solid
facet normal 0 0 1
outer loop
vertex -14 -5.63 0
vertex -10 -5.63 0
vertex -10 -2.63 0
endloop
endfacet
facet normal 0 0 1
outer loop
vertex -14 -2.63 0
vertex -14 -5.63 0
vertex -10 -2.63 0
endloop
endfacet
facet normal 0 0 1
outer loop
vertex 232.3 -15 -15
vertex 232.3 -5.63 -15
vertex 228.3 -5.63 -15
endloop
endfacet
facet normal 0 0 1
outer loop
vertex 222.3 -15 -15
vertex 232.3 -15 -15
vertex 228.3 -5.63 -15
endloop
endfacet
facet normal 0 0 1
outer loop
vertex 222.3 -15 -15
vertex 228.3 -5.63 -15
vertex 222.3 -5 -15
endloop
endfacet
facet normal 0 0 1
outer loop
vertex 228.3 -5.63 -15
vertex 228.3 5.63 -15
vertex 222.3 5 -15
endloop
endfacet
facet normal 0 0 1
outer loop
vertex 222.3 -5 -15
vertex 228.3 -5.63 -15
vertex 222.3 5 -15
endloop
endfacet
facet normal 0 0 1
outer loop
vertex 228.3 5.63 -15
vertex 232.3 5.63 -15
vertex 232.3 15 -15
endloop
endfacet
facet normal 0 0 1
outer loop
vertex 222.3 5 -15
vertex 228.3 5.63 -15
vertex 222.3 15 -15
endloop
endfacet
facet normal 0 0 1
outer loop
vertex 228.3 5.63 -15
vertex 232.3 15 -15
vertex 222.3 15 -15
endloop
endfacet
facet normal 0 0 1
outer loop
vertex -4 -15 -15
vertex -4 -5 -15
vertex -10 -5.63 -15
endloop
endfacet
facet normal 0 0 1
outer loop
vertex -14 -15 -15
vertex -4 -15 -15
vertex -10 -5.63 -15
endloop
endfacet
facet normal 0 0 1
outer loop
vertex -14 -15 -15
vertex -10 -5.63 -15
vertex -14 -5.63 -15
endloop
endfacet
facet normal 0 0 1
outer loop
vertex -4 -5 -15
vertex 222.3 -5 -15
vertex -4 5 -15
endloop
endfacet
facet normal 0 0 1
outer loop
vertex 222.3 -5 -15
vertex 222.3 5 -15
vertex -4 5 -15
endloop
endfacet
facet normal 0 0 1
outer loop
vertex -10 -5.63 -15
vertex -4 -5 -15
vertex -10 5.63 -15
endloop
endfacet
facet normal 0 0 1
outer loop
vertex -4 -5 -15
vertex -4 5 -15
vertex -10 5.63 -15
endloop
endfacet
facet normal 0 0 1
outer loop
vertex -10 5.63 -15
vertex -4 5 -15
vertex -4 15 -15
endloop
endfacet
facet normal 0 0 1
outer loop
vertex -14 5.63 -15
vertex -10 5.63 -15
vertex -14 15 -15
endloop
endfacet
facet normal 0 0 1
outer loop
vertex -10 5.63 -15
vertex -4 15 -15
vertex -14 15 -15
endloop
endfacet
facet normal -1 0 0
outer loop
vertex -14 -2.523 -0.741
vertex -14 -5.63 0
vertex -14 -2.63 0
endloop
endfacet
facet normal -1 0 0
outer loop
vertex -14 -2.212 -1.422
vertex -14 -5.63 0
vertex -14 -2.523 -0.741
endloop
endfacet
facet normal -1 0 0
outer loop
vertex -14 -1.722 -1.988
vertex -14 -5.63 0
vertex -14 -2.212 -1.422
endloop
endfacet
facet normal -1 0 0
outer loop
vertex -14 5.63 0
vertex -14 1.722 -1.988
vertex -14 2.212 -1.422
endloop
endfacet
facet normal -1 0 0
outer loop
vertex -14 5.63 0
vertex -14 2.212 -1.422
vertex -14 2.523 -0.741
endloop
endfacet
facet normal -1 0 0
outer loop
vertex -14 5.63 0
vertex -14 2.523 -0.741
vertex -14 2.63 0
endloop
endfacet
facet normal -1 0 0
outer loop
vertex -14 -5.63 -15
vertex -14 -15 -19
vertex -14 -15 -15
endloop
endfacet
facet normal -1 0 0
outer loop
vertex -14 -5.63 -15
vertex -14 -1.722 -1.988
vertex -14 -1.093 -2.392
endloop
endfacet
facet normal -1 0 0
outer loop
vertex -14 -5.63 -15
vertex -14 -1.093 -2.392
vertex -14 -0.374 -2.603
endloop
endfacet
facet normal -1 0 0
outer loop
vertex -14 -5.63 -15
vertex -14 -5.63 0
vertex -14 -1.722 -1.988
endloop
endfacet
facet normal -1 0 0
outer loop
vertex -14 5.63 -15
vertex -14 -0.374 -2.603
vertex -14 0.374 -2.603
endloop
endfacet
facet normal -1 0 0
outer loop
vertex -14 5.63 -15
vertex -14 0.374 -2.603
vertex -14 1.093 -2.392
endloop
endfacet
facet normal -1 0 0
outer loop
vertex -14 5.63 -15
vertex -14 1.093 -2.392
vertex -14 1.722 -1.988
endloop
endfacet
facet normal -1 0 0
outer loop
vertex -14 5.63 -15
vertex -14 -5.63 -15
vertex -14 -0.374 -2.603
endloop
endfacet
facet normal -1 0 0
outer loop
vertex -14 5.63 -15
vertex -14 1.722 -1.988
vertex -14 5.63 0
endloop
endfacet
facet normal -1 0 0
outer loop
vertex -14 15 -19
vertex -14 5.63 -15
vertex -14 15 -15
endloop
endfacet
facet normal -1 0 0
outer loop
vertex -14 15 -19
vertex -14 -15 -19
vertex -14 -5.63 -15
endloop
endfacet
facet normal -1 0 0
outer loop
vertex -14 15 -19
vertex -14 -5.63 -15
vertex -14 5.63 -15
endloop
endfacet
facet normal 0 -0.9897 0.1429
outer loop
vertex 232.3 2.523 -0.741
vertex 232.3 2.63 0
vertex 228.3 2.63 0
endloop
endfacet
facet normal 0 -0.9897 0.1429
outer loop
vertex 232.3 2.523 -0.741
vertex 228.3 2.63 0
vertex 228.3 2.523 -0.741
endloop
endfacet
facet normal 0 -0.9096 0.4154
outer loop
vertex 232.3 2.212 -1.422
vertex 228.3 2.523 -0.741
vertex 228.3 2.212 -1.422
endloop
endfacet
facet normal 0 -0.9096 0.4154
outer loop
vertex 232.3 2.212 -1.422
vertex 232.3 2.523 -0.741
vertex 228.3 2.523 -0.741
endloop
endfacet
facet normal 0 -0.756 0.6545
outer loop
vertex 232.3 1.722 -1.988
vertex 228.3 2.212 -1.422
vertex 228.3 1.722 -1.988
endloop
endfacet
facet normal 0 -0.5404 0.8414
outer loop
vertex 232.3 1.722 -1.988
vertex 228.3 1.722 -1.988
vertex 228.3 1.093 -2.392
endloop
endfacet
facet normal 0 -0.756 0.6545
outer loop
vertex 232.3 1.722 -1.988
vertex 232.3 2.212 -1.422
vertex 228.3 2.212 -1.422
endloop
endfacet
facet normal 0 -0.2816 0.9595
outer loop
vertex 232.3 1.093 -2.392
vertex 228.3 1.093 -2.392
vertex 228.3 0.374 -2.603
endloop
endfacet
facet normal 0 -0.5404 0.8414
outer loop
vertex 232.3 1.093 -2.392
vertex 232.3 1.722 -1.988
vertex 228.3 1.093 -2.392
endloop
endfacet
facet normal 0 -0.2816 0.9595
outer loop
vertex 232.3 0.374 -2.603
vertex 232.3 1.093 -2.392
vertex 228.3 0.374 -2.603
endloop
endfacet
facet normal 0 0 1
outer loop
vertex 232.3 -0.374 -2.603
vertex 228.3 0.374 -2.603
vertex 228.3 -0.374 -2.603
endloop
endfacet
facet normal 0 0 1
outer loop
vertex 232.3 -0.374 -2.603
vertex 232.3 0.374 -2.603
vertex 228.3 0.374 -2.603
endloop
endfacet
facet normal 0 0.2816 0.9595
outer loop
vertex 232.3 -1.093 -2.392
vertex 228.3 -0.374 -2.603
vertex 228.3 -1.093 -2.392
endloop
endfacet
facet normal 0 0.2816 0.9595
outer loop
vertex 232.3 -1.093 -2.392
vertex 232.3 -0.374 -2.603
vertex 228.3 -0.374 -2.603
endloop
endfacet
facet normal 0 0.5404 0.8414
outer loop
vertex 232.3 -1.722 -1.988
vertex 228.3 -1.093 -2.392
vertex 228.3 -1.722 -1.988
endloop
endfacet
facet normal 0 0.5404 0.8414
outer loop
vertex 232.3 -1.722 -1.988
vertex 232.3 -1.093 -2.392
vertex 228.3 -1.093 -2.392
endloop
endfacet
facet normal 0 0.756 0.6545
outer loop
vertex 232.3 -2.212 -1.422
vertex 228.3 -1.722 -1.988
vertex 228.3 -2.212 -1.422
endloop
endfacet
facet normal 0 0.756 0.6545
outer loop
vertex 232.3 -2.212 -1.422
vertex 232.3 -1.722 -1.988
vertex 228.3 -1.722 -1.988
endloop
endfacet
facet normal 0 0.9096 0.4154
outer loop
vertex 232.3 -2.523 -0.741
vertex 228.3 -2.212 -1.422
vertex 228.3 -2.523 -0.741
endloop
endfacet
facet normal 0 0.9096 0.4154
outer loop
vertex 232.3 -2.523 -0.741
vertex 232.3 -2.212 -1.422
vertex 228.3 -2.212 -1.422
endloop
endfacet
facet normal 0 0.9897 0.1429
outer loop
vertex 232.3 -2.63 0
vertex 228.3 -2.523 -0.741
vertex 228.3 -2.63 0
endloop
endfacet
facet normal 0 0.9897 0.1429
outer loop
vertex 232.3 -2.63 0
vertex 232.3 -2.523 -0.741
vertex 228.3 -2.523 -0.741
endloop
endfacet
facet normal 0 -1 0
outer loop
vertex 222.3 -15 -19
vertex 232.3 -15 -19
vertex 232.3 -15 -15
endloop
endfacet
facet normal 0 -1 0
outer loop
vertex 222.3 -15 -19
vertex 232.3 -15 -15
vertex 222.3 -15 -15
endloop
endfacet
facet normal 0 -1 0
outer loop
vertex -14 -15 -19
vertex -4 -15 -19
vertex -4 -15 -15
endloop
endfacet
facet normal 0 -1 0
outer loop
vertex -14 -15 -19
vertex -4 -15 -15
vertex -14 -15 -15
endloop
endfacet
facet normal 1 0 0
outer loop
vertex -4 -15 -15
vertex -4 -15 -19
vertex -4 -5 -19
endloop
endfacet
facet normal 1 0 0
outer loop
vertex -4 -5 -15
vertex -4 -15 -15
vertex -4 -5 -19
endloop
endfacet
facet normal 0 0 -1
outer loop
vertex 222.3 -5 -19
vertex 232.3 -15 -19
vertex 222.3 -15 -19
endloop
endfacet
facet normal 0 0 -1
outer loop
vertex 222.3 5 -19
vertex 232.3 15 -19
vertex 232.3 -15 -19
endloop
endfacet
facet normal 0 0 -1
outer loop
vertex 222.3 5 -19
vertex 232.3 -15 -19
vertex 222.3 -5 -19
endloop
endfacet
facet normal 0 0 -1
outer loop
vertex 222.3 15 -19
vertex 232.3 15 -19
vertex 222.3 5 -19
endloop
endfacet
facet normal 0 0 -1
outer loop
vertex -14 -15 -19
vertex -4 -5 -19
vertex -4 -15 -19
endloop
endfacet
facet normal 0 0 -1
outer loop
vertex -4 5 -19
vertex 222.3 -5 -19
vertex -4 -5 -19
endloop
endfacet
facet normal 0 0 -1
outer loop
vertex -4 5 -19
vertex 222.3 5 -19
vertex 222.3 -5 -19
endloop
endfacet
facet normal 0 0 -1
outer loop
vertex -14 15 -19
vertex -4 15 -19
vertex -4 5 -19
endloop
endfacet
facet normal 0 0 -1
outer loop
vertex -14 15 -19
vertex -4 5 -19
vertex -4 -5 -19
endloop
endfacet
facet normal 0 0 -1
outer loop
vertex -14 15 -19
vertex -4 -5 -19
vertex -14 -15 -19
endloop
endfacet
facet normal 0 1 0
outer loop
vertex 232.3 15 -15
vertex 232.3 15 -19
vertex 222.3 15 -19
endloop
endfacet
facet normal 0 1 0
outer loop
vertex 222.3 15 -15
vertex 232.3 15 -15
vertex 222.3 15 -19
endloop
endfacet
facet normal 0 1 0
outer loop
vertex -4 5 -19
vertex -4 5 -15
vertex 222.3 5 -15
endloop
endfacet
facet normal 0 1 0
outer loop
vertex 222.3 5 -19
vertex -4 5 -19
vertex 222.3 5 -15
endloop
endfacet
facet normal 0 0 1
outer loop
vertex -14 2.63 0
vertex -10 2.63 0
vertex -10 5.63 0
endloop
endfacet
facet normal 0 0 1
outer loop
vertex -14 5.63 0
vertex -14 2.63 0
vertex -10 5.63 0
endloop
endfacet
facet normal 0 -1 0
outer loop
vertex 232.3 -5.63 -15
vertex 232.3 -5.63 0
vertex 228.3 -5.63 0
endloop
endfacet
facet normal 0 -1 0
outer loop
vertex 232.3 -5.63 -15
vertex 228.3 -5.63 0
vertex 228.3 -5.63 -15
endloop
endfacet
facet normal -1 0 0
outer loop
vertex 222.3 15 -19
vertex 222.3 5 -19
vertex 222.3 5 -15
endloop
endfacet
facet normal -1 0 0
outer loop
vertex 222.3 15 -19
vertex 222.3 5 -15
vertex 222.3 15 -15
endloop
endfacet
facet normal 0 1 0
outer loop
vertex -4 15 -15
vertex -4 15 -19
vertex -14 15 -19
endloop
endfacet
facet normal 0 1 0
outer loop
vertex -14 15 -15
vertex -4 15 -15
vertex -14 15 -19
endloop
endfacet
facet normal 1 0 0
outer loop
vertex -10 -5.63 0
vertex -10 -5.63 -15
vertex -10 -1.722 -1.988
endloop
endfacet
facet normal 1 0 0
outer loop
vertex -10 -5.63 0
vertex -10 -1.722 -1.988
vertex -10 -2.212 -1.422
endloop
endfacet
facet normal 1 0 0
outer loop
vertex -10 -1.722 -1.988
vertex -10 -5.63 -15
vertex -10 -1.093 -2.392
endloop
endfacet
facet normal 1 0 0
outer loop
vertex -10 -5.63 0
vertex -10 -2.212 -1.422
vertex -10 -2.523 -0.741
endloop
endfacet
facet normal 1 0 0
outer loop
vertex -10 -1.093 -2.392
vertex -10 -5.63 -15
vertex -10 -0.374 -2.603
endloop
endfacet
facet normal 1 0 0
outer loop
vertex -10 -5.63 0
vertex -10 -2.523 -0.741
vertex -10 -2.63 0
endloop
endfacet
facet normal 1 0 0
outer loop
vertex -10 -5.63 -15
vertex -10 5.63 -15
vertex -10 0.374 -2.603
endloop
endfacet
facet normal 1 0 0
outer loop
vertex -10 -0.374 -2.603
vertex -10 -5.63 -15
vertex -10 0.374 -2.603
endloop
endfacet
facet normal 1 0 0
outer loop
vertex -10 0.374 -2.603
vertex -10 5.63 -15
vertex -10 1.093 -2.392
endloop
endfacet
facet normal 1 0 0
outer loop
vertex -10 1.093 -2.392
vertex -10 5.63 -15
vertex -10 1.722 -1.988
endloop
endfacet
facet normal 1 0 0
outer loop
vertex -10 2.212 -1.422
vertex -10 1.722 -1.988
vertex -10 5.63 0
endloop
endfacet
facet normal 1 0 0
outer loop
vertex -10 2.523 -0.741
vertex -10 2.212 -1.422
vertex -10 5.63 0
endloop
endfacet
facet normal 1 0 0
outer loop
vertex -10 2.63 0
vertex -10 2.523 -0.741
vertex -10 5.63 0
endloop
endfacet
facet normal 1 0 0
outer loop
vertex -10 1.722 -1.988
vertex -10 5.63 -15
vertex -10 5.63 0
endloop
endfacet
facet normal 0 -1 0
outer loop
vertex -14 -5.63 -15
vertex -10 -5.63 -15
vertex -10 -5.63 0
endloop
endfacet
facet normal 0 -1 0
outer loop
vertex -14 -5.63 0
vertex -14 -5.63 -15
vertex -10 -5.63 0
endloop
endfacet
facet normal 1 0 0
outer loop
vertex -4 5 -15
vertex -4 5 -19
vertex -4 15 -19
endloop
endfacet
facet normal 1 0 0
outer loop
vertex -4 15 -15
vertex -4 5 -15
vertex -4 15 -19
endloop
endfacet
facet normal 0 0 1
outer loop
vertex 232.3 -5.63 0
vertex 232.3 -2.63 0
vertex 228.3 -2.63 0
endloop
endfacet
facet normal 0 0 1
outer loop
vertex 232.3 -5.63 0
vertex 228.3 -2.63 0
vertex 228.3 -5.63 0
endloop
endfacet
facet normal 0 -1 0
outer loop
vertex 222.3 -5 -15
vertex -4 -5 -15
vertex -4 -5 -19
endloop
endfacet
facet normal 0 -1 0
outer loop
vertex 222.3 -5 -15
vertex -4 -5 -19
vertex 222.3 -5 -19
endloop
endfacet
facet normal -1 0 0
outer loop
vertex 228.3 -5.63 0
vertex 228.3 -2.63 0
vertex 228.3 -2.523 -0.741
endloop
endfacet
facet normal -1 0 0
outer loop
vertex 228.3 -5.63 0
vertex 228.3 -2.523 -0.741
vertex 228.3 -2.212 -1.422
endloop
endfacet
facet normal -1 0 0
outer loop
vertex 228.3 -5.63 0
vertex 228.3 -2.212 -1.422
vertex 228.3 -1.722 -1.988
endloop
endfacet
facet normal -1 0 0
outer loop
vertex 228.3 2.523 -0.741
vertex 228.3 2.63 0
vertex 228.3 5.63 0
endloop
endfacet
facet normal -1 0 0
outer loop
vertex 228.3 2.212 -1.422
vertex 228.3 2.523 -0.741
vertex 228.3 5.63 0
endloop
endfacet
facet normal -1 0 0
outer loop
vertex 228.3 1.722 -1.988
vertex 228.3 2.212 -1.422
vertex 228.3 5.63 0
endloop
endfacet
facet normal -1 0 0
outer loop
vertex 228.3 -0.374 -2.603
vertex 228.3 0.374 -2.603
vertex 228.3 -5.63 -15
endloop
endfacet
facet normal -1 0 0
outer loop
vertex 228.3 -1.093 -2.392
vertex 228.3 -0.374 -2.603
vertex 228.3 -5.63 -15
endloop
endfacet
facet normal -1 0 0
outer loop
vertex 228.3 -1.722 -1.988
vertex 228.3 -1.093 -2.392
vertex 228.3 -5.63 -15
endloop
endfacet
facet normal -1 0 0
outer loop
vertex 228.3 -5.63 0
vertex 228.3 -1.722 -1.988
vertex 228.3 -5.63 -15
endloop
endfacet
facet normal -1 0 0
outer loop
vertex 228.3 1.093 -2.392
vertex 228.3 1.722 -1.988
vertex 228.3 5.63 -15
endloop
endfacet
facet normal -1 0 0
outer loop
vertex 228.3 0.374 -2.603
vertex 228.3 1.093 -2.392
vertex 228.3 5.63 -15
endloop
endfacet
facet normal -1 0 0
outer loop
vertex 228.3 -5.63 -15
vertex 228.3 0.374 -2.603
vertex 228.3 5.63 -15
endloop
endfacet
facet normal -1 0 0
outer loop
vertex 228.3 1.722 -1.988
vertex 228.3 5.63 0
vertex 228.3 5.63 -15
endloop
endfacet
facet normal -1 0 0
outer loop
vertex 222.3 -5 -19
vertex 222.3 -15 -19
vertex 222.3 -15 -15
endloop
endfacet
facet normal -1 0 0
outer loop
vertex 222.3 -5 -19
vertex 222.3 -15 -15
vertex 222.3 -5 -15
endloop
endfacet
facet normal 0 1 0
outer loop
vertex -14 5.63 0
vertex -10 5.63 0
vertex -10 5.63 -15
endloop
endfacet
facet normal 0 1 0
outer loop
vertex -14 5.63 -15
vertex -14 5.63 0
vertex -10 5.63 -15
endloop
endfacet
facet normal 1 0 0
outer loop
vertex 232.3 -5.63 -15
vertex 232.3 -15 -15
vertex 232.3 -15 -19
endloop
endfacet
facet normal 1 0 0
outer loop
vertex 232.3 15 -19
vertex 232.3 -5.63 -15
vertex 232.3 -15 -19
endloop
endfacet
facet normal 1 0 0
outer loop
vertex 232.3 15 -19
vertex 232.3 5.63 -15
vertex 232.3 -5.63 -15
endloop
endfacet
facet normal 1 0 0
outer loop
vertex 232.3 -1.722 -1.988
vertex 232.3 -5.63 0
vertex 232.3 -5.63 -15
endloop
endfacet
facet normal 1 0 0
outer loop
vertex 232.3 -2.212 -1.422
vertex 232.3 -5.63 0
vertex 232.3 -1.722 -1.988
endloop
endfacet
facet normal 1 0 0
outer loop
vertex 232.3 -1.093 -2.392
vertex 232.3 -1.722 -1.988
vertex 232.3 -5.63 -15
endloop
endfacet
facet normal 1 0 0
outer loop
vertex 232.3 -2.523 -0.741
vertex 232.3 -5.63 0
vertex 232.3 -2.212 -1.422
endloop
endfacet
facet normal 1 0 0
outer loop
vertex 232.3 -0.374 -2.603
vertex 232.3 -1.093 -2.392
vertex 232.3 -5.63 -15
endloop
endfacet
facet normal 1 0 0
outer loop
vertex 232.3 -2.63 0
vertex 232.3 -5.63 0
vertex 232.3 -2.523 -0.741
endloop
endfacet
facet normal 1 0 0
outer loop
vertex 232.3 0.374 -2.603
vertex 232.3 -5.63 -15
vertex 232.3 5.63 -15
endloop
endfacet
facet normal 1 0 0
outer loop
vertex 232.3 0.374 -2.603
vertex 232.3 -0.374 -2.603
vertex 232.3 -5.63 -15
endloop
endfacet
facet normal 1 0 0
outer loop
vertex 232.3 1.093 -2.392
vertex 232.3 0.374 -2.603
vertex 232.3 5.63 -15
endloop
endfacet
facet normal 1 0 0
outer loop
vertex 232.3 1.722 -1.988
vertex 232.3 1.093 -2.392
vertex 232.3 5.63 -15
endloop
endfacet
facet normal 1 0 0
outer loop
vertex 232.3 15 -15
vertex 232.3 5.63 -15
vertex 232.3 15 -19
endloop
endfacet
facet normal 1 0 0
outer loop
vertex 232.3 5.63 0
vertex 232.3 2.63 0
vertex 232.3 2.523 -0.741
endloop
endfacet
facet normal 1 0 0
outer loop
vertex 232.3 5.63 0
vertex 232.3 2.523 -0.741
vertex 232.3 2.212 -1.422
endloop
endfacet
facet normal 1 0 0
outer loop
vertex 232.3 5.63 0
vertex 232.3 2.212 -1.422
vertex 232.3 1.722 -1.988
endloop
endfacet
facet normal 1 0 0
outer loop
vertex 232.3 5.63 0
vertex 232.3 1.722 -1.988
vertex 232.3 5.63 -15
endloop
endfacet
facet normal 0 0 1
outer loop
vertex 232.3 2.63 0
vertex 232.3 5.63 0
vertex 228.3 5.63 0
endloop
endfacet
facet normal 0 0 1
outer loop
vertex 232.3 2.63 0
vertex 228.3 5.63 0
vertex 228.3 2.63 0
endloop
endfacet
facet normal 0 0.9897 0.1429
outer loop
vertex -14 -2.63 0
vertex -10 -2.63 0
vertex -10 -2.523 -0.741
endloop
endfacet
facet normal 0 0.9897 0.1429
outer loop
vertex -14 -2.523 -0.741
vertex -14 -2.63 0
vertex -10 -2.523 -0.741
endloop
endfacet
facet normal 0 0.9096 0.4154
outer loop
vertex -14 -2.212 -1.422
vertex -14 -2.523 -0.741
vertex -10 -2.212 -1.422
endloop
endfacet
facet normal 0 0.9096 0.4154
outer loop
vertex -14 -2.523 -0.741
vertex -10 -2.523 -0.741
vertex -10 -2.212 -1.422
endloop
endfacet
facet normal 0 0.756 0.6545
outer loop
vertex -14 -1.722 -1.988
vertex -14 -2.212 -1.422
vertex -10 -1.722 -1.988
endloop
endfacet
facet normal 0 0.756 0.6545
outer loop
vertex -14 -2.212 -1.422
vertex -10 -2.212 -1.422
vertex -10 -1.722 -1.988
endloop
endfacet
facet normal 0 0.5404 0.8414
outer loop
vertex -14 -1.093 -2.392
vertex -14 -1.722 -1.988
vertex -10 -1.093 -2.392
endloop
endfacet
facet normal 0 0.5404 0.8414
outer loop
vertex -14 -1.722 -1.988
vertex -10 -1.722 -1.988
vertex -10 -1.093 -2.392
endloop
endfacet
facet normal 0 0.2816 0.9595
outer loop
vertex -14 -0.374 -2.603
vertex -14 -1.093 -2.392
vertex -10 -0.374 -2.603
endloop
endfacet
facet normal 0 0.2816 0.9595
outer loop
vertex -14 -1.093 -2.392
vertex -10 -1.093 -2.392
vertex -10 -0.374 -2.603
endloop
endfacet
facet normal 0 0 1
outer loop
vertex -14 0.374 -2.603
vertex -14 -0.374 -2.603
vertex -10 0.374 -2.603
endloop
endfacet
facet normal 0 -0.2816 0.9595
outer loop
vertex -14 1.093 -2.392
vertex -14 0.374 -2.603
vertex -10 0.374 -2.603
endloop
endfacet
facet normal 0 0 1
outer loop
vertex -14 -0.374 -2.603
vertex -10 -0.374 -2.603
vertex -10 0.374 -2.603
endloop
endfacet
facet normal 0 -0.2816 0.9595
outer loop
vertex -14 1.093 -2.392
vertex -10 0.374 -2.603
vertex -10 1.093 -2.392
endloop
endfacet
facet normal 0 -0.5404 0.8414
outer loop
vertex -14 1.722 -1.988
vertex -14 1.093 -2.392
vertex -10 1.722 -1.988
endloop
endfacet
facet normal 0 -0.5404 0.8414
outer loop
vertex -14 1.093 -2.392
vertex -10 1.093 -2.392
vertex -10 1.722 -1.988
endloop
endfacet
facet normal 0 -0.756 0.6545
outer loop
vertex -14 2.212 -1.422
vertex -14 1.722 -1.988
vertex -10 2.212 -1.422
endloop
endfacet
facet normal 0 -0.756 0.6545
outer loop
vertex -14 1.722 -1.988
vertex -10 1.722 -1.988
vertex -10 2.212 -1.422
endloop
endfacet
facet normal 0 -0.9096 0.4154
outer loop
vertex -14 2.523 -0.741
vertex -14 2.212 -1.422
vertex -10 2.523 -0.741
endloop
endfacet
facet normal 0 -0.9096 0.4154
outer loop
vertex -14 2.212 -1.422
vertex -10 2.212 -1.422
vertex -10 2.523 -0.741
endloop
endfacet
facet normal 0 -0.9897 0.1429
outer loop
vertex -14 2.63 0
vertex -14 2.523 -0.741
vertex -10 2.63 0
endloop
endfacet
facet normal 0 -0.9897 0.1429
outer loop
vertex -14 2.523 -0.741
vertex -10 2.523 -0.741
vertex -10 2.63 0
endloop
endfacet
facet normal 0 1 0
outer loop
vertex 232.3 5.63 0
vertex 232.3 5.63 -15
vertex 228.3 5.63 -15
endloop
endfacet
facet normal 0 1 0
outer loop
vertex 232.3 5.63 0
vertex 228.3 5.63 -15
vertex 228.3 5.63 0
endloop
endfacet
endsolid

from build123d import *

# Parameters (mm, degrees)
EXTRUDE_START   = -15
SKETCH_1_W      = 246.3
SKETCH_1_H      = 10
EXTRUDE_1_DEPTH = 4
SKETCH_2_W      = 10
SKETCH_2_H      = 30
EXTRUDE_2_DEPTH = 4
EXTRUDE_3_DEPTH = 4
EXTRUDE_START_2 = -4
EXTRUDE_4_DEPTH = 4


with BuildPart() as part:
    # 草图1 → 凸台-拉伸1 (new body)
    with BuildSketch(Plane.XY.offset(EXTRUDE_START)):
        with Locations((109.15, 0)):
            Rectangle(SKETCH_1_W, SKETCH_1_H)
    extrude(amount=-EXTRUDE_1_DEPTH)

    # 草图2 → 凸台-拉伸2 (add)
    with BuildSketch(Plane(origin=(0, 0, -19), x_dir=(-1, 0, 0), z_dir=(0, 0, -1))):
        with Locations((9, 0)):
            Rectangle(SKETCH_2_W, SKETCH_2_H)
        with Locations((-227.3, 0)):
            Rectangle(SKETCH_2_W, SKETCH_2_H)
    extrude(amount=-EXTRUDE_2_DEPTH)

    # 草图4 → 凸台-拉伸3 (add)
    with BuildSketch(Plane(origin=(232.3, 0, 0), x_dir=(0, 0, -1), z_dir=(1, 0, 0))):
        with BuildLine():
            Line((0, -2.63), (0, -5.63))
            Line((0, -5.63), (15, -5.63))
            Line((15, -5.63), (15, 5.63))
            Line((15, 5.63), (0, 5.63))
            Line((0, 5.63), (0, 2.63))
            ThreePointArc((0, 2.63), (2.63, 0), (0, -2.63))
        make_face()
    extrude(amount=-EXTRUDE_3_DEPTH)

    # 草图5 → 凸台-拉伸4 (add)
    with BuildSketch(Plane.ZY.offset(14).offset(EXTRUDE_START_2)):
        with BuildLine():
            Line((0, 2.63), (0, 5.63))
            Line((0, 5.63), (-15, 5.63))
            Line((-15, 5.63), (-15, -5.63))
            Line((-15, -5.63), (0, -5.63))
            Line((0, -5.63), (0, -2.63))
            ThreePointArc((0, -2.63), (-2.63, 0), (0, 2.63))
        make_face()
    extrude(amount=EXTRUDE_4_DEPTH)


solid = part.part
